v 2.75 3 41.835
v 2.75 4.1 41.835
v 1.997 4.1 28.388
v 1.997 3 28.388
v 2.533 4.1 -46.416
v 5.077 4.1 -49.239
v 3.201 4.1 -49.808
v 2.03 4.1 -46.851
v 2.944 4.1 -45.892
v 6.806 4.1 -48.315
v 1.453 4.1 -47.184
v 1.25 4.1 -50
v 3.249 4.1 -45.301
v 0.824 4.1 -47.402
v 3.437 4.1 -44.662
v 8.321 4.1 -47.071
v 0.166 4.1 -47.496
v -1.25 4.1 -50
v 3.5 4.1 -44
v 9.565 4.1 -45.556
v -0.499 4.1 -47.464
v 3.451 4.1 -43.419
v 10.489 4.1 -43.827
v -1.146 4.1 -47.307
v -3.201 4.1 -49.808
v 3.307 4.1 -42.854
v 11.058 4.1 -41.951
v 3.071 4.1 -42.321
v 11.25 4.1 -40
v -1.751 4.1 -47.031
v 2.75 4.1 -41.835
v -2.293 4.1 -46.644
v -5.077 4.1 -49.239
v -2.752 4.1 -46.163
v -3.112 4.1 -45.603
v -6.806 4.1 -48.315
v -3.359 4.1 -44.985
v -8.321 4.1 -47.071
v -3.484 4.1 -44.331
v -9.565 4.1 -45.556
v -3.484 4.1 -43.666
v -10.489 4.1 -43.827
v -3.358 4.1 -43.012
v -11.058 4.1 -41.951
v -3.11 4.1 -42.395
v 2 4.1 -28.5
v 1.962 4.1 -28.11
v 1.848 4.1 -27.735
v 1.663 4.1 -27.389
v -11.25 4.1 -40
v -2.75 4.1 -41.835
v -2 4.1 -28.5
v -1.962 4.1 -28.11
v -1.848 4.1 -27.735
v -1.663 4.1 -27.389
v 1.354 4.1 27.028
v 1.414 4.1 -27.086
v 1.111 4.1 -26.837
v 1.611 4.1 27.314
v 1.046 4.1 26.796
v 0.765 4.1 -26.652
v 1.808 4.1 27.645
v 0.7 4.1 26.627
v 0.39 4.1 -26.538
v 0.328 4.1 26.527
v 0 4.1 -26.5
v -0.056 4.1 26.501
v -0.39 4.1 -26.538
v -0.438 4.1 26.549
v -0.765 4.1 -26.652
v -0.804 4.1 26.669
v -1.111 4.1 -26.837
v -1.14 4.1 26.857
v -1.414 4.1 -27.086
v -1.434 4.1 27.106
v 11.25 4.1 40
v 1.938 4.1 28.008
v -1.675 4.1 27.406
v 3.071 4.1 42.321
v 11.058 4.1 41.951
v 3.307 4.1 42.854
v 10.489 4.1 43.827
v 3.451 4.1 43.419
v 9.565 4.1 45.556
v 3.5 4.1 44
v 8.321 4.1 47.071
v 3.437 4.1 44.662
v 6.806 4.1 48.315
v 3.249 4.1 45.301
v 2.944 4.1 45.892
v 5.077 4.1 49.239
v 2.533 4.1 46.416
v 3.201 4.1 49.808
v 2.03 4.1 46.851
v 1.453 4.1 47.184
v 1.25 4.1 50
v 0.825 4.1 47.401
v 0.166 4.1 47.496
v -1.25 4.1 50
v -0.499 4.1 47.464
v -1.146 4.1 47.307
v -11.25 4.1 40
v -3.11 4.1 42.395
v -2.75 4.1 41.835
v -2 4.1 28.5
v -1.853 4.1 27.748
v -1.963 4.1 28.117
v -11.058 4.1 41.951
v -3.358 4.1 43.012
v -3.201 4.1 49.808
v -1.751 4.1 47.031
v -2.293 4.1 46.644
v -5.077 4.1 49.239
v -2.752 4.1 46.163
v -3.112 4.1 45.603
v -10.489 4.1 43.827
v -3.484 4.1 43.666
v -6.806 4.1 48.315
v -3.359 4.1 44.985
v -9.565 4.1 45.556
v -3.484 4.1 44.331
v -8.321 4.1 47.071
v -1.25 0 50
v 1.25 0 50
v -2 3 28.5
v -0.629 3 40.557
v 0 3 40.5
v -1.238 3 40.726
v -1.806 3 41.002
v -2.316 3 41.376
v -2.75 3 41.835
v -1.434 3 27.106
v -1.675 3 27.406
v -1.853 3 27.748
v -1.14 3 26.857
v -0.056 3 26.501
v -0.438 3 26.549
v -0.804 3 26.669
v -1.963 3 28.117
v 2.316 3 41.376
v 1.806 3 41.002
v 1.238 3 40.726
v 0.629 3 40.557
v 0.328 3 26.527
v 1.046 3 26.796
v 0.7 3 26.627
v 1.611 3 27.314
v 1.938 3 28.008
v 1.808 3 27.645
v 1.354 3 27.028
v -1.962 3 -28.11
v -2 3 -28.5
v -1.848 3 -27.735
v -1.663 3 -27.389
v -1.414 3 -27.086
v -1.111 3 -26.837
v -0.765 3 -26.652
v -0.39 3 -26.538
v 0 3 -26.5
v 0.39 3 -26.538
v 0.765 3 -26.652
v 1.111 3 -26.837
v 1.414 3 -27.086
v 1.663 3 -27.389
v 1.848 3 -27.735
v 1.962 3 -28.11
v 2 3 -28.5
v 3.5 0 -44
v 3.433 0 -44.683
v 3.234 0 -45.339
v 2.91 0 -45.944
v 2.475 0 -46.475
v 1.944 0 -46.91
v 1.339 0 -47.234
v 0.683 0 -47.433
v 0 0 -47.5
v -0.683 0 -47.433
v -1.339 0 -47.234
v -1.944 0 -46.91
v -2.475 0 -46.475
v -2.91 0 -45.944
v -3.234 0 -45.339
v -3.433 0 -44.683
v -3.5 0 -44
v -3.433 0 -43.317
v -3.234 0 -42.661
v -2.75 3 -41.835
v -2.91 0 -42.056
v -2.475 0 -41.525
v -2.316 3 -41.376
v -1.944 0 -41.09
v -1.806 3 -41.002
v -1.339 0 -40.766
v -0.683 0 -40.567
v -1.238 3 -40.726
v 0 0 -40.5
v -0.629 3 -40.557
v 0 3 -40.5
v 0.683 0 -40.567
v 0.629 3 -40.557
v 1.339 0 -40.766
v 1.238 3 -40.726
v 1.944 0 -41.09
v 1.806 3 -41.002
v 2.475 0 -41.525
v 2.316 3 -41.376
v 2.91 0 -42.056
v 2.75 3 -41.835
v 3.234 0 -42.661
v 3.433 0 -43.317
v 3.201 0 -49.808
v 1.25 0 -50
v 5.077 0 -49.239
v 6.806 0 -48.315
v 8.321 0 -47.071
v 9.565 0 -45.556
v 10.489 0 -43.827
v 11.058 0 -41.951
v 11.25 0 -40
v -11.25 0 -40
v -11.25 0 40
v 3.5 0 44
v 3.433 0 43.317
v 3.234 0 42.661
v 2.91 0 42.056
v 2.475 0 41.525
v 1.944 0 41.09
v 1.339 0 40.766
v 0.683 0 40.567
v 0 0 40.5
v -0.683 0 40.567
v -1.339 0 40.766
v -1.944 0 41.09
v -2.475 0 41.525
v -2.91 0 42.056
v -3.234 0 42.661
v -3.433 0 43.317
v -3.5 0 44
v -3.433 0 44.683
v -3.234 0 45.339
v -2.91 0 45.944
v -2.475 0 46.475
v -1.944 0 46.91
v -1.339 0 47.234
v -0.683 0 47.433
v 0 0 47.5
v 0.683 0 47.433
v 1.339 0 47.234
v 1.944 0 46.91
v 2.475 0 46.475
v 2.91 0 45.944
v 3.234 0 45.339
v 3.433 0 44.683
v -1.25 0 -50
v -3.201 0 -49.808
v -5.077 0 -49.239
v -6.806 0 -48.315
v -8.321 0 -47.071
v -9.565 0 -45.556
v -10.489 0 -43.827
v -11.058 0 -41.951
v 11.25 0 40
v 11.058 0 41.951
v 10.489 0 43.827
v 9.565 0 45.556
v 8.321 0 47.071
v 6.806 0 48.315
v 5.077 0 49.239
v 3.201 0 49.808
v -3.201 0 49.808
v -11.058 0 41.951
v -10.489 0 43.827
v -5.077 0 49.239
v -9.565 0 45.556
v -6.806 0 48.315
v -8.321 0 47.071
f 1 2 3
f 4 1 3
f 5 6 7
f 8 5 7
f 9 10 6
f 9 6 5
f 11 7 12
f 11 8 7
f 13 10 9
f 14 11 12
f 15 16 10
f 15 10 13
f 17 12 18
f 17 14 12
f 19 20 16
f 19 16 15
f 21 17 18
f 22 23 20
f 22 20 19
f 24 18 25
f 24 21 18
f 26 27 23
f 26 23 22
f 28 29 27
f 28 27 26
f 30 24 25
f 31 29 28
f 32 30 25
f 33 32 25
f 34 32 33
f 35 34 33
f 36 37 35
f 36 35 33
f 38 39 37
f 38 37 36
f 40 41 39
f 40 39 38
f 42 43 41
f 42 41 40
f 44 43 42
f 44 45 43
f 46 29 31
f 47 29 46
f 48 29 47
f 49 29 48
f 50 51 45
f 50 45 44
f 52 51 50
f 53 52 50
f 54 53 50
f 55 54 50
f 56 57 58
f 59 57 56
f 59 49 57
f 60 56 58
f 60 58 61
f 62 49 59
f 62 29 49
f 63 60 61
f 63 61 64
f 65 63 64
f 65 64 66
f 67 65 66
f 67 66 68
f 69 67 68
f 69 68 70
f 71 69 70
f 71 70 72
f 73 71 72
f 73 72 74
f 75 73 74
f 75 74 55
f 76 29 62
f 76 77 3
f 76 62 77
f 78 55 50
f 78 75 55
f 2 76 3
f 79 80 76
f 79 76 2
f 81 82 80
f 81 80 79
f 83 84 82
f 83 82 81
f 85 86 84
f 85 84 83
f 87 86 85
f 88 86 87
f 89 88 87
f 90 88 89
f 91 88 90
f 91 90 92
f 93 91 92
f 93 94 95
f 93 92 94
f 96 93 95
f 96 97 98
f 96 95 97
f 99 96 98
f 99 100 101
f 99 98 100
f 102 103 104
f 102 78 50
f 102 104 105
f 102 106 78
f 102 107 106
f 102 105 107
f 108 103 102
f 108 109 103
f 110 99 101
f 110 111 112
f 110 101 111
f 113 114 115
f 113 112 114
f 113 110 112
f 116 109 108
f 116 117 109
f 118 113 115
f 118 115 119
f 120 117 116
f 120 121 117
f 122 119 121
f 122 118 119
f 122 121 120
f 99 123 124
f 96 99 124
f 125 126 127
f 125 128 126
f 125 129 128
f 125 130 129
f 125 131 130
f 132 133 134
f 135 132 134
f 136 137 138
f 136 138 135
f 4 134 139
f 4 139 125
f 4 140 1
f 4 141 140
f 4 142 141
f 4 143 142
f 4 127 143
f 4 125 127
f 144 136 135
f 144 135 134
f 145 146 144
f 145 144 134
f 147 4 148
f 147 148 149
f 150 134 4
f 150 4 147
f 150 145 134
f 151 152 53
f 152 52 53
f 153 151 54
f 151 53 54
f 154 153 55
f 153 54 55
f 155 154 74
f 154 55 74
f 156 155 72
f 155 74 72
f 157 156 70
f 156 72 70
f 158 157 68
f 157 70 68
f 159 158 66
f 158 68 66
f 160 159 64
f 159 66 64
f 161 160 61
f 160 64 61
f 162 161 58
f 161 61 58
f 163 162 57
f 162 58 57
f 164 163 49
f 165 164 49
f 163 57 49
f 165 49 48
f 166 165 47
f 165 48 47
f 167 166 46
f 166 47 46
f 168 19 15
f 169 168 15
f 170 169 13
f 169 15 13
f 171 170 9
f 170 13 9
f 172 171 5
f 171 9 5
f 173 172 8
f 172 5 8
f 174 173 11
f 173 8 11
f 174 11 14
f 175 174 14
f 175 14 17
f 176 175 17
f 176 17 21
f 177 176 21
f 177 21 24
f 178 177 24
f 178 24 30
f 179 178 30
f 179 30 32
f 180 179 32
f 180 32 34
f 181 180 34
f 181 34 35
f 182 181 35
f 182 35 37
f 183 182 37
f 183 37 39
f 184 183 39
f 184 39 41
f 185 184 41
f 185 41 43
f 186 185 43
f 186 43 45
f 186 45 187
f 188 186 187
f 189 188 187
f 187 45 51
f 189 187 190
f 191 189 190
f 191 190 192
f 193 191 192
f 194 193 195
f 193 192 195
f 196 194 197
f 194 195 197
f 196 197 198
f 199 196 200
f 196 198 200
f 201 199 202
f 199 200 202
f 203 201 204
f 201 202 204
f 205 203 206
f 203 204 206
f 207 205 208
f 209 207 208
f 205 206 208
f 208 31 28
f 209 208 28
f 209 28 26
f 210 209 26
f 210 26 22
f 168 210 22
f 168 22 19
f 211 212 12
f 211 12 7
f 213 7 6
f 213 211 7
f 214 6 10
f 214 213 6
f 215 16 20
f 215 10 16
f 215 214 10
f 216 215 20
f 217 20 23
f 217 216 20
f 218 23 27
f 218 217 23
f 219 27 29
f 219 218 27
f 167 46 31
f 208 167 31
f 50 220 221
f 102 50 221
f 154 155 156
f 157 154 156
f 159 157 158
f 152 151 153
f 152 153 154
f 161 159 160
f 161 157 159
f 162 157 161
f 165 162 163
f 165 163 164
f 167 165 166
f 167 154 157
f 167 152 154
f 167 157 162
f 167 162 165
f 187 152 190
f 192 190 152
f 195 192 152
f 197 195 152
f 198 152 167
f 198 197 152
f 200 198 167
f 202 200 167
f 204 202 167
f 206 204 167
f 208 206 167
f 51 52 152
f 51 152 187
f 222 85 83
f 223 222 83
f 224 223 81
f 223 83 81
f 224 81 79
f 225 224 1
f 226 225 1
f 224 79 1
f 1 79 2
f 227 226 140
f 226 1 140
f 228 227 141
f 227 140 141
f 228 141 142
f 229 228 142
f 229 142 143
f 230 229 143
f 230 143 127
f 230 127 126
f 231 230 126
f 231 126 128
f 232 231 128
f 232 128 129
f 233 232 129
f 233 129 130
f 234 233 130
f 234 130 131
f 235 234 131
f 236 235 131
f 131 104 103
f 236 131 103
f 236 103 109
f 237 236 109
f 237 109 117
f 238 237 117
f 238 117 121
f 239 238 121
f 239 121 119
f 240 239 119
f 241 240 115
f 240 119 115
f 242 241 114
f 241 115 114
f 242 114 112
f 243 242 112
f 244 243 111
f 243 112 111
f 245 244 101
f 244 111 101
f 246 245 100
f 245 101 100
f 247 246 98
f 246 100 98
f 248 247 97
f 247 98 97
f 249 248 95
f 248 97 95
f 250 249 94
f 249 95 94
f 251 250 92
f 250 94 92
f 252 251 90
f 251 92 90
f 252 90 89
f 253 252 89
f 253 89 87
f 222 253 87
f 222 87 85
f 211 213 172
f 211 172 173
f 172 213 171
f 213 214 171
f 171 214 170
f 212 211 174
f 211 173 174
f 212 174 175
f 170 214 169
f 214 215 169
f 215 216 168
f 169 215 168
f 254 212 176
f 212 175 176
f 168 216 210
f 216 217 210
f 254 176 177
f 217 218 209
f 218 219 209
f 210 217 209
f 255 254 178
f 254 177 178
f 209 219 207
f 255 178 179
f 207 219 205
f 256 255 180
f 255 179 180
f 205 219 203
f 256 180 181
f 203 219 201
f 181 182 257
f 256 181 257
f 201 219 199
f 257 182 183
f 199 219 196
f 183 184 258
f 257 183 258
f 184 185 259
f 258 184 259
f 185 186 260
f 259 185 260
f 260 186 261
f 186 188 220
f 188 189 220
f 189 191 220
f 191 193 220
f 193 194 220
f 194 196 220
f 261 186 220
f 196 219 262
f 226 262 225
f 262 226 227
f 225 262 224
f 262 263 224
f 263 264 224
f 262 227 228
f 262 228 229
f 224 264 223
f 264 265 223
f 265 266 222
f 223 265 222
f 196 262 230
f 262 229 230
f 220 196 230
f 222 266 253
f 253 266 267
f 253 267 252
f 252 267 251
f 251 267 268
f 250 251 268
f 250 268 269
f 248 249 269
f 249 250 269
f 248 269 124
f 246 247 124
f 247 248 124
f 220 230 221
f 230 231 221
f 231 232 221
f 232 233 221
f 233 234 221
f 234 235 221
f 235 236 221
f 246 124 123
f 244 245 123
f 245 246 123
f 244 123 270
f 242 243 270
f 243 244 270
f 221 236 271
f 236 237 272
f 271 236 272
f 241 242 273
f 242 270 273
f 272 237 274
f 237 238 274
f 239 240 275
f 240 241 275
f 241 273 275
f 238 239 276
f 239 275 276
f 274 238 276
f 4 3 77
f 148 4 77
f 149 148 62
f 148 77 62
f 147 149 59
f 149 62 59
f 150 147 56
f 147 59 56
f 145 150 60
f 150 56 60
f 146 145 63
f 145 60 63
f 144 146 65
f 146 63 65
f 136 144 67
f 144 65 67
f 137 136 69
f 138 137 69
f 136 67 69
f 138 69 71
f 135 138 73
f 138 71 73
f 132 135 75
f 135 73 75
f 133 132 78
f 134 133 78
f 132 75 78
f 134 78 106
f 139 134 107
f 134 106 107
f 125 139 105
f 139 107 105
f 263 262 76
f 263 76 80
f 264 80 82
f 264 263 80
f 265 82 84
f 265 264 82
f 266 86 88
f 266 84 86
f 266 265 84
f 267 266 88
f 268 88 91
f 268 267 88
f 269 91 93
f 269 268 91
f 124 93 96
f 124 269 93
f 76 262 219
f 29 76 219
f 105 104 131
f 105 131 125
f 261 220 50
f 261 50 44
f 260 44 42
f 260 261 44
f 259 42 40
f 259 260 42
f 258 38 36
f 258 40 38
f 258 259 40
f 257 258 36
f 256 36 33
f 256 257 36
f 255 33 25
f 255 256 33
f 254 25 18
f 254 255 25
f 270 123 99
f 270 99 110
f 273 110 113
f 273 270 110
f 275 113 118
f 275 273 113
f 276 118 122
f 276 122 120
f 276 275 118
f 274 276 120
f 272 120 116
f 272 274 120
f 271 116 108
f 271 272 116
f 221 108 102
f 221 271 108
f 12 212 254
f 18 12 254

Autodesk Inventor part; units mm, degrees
ref_plane "YZ Plane" through (0, 0, 0) normal (1, 0, 0) x (0, 1, 0)
ref_plane "XZ Plane" through (0, 0, 0) normal (0, 1, 0) x (-1, 0, 0)
ref_plane "XY Plane" through (0, 0, 0) normal (0, 0, 1) x (1, 0, 0)
sketch "Szkic1" plane through (0, 0, 0) normal (0, 1, 0) x (-1, 0, 0)
  line L0 (1.25, 50) -> (-1.25, 50)
  line L1 (-11.25, 40) -> (-11.25, -40)
  line L2 (-1.25, -50) -> (1.25, -50)
  line L3 (11.25, -40) -> (11.25, 40)
  line L4 (11.25, 50) -> (-11.25, -50)
  line L5 (11.25, -50) -> (-11.25, 50)
  arc A0 (11.25, 40) -> (1.25, 50) centre (1.25, 40) ccw
  arc A1 (-1.25, 50) -> (-11.25, 40) centre (-1.25, 40) ccw
  arc A2 (1.25, -50) -> (11.25, -40) centre (1.25, -40) ccw
  arc A3 (-11.25, -40) -> (-1.25, -50) centre (-1.25, -40) ccw
  point P0 (0, 0)
  point P1 (0, 0)
  dimension "d0" = 22.5
  dimension "d1" = 100
  dimension "d2" = 10
extrude "Wyciągnięcie proste1" add sketch "Szkic1" along normal blind 4.1
sketch "Szkic2" plane through (0, 4.1, 0) normal (0, 1, 0) x (1, 0, 0)
  circle A0 centre (0, 44) radius 3.5
  line L0 (1.25, 50) -> (-1.25, 50) projected
  point P0 (0, 0)
  point P1 (0, 50)
  dimension "d5" = 7
  dimension "d14" = 6
extrude "Wyciągnięcie proste2" cut sketch "Szkic2" against normal blind 8
sketch "Szkic3" plane through (0, 4.1, 0) normal (0, 1, 0) x (1, 0, 0)
  line L0 (0, 47.5) -> (0, 28.5)
  arc A0 (-2, 28.5) -> (2, 28.5) centre (0, 28.5) ccw
  line L1 (-2.75, 41.8349) -> (0, 41.8349)
  line L2 (1.25, 50) -> (-1.25, 50) projected
  line L3 (-2, 28.5) -> (-2.75, 41.8349)
  line L4 (2, 28.5) -> (2.75, 41.8349)
  line L5 (0, 41.8349) -> (2.75, 41.8349)
  circle A1 centre (0, 44) radius 3.5 projected
  point P0 (0, 0)
  point P1 (0, 50)
  dimension "d8" = 19
  dimension "d10" = 5.5
  dimension "d22" = 13.3349
extrude "Wyciągnięcie proste3" cut sketch "Szkic3" against normal blind 1.1 contours L5 A1 L0 | L0 A1 L1 | A1 L4 A0 L3 picked at (1.6483, 41.6479) picked at (-1.6483, 41.6479)
sketch "Szkic4" plane through (0, 4.1, 0) normal (0, 1, 0) x (1, 0, 0)
  circle A0 centre (0, -44) radius 3.5
  line L0 (-1.25, -50) -> (1.25, -50) projected
  point P0 (0, 0)
  point P1 (0, -50)
  dimension "d15" = 7
  dimension "d16" = 6
extrude "Wyciągnięcie proste4" cut sketch "Szkic4" against normal blind 10
sketch "Szkic7" plane through (0, 4.1, 0) normal (0, 1, 0) x (1, 0, 0)
  line L0 (-1.25, -50) -> (1.25, -50) projected
  line L1 (0, -50) -> (0, -28.5)
  line L2 (0, -50) -> (0, -41.835)
  line L3 (0, -28.5) -> (0, -41.835)
  circle A0 centre (0, -44) radius 3.5 projected
  line L4 (-2.75, -41.835) -> (2.75, -41.835)
  line L5 (-2.75, -41.835) -> (-2, -28.5)
  line L6 (2.75, -41.835) -> (1.9969, -28.3882)
  arc A1 (1.9969, -28.3882) -> (-2, -28.5) centre (0, -28.5) ccw
  point P0 (0, 0)
  dimension "d19" = 21.5
  dimension "d24" = 13.335
  dimension "d25" = 5.5001
extrude "Wyciągnięcie proste5" cut sketch "Szkic7" against normal blind 1.1 contours L5 A1 L6 A0
properties part number "arm_big_part"
